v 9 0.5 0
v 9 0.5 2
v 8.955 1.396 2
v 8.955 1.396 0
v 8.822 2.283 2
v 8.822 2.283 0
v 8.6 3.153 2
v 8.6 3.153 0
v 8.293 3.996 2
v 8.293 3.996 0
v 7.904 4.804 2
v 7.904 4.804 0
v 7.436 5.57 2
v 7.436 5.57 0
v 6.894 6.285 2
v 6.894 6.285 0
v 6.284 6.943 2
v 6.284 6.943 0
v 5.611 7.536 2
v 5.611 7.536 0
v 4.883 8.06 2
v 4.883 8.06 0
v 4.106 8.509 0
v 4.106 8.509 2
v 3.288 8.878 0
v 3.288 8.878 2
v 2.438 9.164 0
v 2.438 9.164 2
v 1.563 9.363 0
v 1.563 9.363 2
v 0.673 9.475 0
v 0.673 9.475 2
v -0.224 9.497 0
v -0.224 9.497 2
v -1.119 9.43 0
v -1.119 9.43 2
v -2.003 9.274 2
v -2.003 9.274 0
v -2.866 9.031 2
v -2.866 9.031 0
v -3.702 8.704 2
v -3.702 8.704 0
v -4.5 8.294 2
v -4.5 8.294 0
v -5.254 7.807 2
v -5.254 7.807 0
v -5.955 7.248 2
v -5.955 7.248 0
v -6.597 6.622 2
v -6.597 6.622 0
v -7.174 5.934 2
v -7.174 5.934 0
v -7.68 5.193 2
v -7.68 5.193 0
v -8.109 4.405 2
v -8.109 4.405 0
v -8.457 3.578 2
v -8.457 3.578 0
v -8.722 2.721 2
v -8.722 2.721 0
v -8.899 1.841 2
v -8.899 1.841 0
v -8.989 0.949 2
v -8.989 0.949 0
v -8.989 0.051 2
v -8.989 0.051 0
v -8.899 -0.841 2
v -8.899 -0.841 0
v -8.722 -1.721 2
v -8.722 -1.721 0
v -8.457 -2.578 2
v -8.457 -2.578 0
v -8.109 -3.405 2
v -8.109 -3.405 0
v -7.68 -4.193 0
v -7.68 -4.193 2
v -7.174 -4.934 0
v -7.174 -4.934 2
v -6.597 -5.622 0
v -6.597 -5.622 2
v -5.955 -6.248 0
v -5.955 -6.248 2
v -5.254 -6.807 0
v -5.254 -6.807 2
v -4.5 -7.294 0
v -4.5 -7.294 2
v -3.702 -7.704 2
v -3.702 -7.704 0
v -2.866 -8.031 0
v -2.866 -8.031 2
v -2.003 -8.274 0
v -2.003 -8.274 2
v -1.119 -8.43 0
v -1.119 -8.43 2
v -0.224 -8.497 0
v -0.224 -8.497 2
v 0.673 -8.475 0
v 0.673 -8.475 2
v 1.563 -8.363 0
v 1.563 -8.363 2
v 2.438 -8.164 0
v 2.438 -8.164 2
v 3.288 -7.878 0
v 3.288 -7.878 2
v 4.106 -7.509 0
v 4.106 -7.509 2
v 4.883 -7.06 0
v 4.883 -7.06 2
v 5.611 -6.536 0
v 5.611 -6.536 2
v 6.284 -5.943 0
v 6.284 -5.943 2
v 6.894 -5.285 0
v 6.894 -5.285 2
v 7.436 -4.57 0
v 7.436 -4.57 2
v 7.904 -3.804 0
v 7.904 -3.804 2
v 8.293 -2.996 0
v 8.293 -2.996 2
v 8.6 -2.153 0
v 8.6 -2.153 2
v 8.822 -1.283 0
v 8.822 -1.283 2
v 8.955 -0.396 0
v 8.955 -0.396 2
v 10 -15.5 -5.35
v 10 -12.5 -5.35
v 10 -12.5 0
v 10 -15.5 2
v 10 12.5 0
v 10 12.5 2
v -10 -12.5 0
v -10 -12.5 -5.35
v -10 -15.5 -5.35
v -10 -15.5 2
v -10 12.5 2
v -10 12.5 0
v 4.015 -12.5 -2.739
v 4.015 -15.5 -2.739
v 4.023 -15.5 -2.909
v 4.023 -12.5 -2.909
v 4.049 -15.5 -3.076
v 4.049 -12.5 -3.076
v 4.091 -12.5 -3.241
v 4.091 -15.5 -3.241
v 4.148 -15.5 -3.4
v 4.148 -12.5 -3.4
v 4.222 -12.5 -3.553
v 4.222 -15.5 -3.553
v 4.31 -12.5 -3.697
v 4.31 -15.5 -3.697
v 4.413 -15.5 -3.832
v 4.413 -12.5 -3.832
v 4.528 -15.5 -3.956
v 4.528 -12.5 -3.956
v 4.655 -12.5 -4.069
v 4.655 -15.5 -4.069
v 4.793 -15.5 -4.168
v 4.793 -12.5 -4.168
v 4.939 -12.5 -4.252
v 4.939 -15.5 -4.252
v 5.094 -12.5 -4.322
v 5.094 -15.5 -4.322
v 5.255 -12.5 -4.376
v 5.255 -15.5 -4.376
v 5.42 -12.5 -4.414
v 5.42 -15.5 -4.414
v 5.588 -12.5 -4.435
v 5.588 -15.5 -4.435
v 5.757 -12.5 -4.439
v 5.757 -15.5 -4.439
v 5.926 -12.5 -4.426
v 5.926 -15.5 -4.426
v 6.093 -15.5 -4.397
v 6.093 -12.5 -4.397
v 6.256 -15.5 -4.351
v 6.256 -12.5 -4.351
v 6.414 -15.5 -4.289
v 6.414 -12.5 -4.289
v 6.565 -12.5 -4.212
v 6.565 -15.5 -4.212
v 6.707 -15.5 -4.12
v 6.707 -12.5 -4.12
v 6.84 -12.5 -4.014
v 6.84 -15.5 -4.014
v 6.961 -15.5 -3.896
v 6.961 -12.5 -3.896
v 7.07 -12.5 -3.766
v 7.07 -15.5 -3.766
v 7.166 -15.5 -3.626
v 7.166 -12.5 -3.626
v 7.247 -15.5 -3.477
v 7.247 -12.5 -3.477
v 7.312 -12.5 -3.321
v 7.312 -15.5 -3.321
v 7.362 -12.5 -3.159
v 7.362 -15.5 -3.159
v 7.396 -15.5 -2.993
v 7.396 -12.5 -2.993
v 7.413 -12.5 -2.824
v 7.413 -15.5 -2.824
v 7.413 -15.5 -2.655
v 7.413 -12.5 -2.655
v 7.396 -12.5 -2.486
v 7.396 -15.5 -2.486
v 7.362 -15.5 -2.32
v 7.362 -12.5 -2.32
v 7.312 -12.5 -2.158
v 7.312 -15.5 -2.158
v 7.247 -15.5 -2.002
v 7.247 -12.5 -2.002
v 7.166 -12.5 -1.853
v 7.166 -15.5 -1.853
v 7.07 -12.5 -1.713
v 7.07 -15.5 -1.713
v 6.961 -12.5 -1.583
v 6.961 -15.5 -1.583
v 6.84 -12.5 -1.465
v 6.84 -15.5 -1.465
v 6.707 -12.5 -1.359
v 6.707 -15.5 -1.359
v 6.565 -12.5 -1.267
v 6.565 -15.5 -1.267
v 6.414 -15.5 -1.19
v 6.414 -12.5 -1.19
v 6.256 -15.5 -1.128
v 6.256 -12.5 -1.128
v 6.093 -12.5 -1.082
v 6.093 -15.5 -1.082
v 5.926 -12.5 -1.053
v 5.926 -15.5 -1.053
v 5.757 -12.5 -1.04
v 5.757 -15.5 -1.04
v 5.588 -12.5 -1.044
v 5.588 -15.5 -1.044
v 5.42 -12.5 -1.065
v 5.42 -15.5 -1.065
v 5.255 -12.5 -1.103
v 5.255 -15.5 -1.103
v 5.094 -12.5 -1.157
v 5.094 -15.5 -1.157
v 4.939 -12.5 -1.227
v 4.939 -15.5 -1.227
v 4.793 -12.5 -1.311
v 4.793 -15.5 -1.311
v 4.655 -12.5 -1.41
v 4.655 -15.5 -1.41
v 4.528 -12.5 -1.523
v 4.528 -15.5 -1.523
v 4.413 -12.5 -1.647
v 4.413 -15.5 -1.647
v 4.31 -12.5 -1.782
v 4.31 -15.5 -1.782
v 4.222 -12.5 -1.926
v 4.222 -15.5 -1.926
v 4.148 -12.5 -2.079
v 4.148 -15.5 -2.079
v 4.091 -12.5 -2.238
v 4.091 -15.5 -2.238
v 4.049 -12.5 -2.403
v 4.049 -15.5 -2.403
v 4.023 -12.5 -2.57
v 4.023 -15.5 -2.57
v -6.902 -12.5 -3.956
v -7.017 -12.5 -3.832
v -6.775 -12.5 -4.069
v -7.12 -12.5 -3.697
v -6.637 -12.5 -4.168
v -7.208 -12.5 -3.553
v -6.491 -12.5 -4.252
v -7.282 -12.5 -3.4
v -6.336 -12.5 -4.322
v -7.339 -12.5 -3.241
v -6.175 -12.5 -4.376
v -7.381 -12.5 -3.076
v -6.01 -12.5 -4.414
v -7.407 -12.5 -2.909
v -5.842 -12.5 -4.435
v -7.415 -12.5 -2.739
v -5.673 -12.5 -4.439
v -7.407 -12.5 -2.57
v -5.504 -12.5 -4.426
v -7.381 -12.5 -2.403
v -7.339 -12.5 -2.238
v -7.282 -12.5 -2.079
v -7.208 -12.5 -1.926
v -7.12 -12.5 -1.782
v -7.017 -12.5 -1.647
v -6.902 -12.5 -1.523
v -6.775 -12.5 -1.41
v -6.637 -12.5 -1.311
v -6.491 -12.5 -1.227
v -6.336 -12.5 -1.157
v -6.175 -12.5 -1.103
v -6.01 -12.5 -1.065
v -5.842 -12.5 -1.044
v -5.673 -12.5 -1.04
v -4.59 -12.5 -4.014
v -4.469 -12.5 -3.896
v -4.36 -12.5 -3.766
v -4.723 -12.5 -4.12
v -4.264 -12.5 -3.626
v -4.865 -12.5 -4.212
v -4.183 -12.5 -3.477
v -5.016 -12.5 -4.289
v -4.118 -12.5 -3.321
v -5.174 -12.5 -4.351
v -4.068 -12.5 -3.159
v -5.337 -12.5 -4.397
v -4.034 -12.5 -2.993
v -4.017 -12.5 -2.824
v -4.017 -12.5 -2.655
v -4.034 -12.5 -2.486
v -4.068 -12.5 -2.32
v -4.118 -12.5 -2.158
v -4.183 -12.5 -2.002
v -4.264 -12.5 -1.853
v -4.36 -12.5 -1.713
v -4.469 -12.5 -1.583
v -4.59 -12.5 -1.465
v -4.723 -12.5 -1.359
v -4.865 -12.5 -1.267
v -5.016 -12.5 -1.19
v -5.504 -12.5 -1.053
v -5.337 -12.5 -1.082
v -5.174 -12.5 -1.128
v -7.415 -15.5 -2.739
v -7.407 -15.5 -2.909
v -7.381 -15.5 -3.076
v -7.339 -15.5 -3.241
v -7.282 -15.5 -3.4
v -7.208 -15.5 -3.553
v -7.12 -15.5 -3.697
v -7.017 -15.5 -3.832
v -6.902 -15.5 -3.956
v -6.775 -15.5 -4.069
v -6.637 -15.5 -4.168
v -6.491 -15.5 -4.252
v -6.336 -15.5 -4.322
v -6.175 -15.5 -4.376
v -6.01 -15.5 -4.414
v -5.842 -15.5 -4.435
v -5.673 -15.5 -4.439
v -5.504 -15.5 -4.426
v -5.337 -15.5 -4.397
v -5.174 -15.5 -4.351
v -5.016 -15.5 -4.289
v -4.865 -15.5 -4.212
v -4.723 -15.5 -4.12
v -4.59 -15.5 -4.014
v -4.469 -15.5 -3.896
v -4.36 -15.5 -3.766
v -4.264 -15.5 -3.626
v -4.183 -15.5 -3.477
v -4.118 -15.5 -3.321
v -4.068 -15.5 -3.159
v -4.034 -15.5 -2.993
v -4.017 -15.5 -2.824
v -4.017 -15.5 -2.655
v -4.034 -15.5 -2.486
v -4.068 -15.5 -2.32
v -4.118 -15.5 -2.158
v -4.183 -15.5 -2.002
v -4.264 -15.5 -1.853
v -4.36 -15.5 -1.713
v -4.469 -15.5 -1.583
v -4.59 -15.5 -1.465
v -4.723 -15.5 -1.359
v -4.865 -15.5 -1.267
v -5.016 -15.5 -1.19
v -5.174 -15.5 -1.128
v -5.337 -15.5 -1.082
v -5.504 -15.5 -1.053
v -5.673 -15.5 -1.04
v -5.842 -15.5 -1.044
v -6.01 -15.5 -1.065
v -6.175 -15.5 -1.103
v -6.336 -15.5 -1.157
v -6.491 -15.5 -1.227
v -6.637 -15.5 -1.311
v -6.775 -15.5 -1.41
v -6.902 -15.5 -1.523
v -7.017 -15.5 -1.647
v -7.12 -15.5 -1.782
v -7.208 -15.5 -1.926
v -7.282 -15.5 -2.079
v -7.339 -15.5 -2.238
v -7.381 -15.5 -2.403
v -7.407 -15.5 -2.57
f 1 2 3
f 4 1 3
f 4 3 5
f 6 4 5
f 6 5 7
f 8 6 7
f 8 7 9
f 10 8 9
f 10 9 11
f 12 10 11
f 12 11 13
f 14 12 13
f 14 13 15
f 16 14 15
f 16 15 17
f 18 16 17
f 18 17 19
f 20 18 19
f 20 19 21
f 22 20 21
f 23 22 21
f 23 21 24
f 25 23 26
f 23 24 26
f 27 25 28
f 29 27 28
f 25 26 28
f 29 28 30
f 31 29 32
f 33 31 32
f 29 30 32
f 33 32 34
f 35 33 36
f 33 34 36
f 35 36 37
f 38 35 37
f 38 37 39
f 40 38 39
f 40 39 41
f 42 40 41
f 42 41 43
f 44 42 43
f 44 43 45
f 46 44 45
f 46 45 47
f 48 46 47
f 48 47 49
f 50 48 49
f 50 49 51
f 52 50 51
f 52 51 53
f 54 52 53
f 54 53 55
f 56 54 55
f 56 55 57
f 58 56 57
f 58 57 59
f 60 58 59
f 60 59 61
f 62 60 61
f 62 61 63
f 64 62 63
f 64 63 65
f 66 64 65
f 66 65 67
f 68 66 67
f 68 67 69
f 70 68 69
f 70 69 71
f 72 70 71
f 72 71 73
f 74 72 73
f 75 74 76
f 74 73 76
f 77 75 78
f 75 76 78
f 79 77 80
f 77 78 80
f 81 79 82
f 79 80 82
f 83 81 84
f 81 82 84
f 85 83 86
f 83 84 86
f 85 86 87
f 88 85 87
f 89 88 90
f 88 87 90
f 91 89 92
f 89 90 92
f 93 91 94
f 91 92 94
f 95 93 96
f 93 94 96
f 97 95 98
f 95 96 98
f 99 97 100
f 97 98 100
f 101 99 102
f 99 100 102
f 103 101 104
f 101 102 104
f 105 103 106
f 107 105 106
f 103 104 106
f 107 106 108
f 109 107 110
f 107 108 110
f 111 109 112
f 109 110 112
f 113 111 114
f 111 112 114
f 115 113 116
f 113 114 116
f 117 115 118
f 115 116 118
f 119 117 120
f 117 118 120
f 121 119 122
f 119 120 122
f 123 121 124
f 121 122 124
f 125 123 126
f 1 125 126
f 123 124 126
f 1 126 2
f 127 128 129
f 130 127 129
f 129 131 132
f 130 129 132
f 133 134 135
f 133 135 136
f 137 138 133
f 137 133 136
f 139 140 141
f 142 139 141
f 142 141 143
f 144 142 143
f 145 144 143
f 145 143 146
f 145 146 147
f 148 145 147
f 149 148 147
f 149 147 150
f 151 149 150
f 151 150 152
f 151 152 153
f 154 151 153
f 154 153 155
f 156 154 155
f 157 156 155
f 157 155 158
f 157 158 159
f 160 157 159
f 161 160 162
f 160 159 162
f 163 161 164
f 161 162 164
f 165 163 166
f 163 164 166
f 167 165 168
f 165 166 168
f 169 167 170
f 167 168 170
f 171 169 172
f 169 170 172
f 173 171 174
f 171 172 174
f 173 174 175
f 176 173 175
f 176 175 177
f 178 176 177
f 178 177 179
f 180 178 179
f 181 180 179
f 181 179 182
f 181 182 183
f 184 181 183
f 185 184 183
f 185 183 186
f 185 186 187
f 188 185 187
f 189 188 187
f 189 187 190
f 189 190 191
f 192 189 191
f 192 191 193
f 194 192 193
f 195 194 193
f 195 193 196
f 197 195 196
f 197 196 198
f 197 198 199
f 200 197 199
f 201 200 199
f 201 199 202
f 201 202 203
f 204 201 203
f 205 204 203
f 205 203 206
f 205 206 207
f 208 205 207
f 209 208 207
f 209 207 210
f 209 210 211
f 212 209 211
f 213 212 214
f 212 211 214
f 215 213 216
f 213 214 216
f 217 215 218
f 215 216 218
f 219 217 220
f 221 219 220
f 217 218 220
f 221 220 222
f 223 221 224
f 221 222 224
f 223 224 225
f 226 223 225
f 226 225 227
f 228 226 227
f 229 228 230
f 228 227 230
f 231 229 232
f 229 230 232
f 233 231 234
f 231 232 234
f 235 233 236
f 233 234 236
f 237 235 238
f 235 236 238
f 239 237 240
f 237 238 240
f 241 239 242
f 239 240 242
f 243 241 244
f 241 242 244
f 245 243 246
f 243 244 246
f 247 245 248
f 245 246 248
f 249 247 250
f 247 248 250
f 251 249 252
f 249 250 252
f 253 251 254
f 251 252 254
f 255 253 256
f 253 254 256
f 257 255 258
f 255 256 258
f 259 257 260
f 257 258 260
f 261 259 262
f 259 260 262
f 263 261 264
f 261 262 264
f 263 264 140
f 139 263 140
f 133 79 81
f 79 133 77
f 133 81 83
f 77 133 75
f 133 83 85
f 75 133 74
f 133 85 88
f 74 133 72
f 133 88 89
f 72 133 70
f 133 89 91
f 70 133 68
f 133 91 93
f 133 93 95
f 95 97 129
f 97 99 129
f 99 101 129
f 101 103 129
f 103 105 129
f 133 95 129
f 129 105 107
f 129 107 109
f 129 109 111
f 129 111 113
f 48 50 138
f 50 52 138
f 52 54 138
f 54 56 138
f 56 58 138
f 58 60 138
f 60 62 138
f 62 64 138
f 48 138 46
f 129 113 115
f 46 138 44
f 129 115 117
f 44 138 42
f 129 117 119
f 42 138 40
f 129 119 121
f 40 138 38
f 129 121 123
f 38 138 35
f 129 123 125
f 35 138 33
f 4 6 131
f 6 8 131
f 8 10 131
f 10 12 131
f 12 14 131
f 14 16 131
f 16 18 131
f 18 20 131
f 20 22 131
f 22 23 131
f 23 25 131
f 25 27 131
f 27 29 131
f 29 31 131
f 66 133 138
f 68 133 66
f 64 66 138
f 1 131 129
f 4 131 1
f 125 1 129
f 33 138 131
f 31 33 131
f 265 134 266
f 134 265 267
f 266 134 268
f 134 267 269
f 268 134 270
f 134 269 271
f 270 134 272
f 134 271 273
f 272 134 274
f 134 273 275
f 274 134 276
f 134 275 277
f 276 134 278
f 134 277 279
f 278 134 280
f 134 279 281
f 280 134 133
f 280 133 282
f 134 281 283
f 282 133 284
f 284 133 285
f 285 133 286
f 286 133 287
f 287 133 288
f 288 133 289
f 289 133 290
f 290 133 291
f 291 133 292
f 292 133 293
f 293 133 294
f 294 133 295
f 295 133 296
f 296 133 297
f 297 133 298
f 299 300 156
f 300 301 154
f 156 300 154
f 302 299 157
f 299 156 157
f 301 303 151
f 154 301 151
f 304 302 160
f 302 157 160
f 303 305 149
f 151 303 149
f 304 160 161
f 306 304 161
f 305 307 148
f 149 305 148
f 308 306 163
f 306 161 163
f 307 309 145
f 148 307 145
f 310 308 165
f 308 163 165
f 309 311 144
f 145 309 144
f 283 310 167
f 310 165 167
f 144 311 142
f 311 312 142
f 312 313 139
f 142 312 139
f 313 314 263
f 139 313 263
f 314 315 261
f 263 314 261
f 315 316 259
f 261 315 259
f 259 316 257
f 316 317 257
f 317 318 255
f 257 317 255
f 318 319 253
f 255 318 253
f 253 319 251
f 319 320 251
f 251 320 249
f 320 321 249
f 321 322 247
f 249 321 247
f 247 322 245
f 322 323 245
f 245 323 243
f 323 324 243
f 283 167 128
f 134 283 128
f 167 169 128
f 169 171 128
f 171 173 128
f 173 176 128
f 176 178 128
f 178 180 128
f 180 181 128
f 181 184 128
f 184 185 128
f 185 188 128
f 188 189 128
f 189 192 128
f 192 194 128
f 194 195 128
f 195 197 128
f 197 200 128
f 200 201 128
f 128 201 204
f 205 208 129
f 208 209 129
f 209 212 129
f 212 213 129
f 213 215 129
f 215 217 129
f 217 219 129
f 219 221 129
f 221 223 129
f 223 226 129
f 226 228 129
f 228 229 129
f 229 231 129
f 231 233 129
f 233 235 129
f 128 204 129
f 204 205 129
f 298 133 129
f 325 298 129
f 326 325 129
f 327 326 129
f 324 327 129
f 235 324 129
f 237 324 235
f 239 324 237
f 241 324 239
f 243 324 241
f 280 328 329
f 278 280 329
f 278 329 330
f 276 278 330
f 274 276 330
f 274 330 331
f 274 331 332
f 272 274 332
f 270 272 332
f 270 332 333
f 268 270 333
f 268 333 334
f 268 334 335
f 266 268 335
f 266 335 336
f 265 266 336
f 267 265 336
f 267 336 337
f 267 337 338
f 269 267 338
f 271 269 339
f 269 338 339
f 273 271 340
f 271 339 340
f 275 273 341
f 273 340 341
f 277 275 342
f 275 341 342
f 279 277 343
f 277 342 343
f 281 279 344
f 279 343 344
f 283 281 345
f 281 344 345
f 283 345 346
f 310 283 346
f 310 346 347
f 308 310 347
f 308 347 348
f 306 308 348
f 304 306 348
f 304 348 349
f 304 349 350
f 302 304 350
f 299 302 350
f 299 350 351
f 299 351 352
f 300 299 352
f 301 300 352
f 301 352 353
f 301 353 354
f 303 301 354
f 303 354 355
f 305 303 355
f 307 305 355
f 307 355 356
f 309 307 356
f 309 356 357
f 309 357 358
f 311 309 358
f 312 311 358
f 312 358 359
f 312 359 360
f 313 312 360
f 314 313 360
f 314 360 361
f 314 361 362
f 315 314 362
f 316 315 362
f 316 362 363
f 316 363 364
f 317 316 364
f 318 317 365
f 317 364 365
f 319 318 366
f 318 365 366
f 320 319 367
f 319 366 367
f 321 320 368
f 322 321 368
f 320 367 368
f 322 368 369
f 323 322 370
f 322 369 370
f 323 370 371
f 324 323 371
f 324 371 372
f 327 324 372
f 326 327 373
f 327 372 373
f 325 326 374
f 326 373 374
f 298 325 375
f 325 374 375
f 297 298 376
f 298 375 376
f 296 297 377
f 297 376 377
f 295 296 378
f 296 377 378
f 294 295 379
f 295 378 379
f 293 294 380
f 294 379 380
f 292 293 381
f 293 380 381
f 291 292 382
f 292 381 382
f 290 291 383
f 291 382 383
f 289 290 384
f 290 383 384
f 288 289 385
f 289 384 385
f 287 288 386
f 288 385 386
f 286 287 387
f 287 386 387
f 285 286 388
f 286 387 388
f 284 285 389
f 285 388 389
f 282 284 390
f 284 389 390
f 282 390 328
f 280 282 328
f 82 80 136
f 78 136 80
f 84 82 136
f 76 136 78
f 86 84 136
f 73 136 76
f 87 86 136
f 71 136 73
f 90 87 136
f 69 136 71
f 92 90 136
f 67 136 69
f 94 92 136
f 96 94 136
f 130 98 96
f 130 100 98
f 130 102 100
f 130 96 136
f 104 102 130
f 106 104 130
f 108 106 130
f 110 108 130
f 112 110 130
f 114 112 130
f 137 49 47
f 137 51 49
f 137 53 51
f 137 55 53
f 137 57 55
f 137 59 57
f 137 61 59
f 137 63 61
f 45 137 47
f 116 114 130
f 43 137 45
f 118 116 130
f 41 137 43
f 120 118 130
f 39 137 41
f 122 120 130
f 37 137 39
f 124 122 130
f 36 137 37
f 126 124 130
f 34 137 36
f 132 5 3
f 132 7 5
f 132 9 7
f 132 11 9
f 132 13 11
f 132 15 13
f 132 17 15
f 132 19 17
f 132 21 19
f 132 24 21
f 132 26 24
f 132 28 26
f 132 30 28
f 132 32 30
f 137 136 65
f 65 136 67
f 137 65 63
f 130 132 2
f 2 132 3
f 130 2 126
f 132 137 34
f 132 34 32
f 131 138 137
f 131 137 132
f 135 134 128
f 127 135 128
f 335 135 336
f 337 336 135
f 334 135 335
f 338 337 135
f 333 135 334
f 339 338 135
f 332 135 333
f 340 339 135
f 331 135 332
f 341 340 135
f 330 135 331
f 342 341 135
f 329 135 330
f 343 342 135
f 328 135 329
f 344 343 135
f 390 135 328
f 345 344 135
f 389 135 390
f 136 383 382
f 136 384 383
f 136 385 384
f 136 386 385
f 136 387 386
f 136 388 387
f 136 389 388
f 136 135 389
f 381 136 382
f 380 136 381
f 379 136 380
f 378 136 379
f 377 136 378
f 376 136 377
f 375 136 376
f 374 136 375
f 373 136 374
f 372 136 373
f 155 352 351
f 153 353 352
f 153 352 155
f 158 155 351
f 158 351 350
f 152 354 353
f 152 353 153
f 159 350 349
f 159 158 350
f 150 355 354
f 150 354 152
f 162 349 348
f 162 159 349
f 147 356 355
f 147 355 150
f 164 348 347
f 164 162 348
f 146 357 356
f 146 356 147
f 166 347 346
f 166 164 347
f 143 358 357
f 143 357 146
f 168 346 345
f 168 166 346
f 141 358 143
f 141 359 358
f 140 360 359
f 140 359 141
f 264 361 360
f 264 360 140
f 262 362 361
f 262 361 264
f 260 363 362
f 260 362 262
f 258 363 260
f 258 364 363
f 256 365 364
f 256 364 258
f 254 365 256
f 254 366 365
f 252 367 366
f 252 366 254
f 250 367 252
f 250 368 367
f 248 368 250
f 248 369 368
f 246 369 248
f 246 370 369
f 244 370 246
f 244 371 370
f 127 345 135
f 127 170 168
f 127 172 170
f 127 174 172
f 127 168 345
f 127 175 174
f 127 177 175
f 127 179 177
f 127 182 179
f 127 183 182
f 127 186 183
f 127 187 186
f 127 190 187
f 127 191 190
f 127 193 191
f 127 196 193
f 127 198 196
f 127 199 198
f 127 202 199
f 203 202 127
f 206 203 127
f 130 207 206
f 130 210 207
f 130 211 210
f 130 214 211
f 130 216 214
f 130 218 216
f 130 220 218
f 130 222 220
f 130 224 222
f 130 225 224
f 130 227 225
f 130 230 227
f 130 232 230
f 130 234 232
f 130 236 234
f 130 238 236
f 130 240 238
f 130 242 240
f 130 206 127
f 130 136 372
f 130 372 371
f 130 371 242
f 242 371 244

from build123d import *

# Parameters (mm, degrees)
SKETCH1_W            = 20
SKETCH1_H            = 25
BOSS_EXTRUDE1_DEPTH  = 2
SKETCH2_W            = 20
SKETCH2_H            = 12.7
BOSS_EXTRUDE2_DEPTH  = 3
M3_CLEARANCE_HOLE1_D = 3.4
SKETCH7_R            = 9
CUT_EXTRUDE1_DEPTH   = 20.856296231
SKETCH8_W            = 20
SKETCH8_H            = 5.35
CUT_EXTRUDE2_DEPTH   = 28.910974544


with BuildPart() as part:
    # Sketch1 → Boss-Extrude1 (new body)
    with BuildSketch(Plane.XY):
        Rectangle(SKETCH1_W, SKETCH1_H)
    extrude(amount=BOSS_EXTRUDE1_DEPTH)

    # Sketch2 → Boss-Extrude2 (add)
    with BuildSketch(Plane.XZ.offset(12.5)):
        with Locations((0, 1)):
            Rectangle(SKETCH2_W, SKETCH2_H)
    extrude(amount=BOSS_EXTRUDE2_DEPTH)

    # M3 Clearance Hole1 (through all)
    with Locations(Plane(origin=(0, -12.5, 0), x_dir=(1, 0, 0), z_dir=(0, 1, 0))):
        with Locations((-5.715, 2.739497088), (5.715, 2.739497088)):
            Hole(M3_CLEARANCE_HOLE1_D / 2)

    # Sketch7 → Cut-Extrude1 (cut, through all)
    with BuildSketch(Plane.XY.offset(2)):
        with Locations((0, 0.5)):
            Circle(SKETCH7_R)
    extrude(amount=-CUT_EXTRUDE1_DEPTH, mode=Mode.SUBTRACT)

    # Sketch8 → Cut-Extrude2 (cut, through all)
    with BuildSketch(Plane(origin=(0, -12.5, 0), x_dir=(1, 0, 0), z_dir=(0, 1, 0))):
        with Locations((0, -4.675)):
            Rectangle(SKETCH8_W, SKETCH8_H)
    extrude(amount=-CUT_EXTRUDE2_DEPTH, mode=Mode.SUBTRACT)


solid = part.part
